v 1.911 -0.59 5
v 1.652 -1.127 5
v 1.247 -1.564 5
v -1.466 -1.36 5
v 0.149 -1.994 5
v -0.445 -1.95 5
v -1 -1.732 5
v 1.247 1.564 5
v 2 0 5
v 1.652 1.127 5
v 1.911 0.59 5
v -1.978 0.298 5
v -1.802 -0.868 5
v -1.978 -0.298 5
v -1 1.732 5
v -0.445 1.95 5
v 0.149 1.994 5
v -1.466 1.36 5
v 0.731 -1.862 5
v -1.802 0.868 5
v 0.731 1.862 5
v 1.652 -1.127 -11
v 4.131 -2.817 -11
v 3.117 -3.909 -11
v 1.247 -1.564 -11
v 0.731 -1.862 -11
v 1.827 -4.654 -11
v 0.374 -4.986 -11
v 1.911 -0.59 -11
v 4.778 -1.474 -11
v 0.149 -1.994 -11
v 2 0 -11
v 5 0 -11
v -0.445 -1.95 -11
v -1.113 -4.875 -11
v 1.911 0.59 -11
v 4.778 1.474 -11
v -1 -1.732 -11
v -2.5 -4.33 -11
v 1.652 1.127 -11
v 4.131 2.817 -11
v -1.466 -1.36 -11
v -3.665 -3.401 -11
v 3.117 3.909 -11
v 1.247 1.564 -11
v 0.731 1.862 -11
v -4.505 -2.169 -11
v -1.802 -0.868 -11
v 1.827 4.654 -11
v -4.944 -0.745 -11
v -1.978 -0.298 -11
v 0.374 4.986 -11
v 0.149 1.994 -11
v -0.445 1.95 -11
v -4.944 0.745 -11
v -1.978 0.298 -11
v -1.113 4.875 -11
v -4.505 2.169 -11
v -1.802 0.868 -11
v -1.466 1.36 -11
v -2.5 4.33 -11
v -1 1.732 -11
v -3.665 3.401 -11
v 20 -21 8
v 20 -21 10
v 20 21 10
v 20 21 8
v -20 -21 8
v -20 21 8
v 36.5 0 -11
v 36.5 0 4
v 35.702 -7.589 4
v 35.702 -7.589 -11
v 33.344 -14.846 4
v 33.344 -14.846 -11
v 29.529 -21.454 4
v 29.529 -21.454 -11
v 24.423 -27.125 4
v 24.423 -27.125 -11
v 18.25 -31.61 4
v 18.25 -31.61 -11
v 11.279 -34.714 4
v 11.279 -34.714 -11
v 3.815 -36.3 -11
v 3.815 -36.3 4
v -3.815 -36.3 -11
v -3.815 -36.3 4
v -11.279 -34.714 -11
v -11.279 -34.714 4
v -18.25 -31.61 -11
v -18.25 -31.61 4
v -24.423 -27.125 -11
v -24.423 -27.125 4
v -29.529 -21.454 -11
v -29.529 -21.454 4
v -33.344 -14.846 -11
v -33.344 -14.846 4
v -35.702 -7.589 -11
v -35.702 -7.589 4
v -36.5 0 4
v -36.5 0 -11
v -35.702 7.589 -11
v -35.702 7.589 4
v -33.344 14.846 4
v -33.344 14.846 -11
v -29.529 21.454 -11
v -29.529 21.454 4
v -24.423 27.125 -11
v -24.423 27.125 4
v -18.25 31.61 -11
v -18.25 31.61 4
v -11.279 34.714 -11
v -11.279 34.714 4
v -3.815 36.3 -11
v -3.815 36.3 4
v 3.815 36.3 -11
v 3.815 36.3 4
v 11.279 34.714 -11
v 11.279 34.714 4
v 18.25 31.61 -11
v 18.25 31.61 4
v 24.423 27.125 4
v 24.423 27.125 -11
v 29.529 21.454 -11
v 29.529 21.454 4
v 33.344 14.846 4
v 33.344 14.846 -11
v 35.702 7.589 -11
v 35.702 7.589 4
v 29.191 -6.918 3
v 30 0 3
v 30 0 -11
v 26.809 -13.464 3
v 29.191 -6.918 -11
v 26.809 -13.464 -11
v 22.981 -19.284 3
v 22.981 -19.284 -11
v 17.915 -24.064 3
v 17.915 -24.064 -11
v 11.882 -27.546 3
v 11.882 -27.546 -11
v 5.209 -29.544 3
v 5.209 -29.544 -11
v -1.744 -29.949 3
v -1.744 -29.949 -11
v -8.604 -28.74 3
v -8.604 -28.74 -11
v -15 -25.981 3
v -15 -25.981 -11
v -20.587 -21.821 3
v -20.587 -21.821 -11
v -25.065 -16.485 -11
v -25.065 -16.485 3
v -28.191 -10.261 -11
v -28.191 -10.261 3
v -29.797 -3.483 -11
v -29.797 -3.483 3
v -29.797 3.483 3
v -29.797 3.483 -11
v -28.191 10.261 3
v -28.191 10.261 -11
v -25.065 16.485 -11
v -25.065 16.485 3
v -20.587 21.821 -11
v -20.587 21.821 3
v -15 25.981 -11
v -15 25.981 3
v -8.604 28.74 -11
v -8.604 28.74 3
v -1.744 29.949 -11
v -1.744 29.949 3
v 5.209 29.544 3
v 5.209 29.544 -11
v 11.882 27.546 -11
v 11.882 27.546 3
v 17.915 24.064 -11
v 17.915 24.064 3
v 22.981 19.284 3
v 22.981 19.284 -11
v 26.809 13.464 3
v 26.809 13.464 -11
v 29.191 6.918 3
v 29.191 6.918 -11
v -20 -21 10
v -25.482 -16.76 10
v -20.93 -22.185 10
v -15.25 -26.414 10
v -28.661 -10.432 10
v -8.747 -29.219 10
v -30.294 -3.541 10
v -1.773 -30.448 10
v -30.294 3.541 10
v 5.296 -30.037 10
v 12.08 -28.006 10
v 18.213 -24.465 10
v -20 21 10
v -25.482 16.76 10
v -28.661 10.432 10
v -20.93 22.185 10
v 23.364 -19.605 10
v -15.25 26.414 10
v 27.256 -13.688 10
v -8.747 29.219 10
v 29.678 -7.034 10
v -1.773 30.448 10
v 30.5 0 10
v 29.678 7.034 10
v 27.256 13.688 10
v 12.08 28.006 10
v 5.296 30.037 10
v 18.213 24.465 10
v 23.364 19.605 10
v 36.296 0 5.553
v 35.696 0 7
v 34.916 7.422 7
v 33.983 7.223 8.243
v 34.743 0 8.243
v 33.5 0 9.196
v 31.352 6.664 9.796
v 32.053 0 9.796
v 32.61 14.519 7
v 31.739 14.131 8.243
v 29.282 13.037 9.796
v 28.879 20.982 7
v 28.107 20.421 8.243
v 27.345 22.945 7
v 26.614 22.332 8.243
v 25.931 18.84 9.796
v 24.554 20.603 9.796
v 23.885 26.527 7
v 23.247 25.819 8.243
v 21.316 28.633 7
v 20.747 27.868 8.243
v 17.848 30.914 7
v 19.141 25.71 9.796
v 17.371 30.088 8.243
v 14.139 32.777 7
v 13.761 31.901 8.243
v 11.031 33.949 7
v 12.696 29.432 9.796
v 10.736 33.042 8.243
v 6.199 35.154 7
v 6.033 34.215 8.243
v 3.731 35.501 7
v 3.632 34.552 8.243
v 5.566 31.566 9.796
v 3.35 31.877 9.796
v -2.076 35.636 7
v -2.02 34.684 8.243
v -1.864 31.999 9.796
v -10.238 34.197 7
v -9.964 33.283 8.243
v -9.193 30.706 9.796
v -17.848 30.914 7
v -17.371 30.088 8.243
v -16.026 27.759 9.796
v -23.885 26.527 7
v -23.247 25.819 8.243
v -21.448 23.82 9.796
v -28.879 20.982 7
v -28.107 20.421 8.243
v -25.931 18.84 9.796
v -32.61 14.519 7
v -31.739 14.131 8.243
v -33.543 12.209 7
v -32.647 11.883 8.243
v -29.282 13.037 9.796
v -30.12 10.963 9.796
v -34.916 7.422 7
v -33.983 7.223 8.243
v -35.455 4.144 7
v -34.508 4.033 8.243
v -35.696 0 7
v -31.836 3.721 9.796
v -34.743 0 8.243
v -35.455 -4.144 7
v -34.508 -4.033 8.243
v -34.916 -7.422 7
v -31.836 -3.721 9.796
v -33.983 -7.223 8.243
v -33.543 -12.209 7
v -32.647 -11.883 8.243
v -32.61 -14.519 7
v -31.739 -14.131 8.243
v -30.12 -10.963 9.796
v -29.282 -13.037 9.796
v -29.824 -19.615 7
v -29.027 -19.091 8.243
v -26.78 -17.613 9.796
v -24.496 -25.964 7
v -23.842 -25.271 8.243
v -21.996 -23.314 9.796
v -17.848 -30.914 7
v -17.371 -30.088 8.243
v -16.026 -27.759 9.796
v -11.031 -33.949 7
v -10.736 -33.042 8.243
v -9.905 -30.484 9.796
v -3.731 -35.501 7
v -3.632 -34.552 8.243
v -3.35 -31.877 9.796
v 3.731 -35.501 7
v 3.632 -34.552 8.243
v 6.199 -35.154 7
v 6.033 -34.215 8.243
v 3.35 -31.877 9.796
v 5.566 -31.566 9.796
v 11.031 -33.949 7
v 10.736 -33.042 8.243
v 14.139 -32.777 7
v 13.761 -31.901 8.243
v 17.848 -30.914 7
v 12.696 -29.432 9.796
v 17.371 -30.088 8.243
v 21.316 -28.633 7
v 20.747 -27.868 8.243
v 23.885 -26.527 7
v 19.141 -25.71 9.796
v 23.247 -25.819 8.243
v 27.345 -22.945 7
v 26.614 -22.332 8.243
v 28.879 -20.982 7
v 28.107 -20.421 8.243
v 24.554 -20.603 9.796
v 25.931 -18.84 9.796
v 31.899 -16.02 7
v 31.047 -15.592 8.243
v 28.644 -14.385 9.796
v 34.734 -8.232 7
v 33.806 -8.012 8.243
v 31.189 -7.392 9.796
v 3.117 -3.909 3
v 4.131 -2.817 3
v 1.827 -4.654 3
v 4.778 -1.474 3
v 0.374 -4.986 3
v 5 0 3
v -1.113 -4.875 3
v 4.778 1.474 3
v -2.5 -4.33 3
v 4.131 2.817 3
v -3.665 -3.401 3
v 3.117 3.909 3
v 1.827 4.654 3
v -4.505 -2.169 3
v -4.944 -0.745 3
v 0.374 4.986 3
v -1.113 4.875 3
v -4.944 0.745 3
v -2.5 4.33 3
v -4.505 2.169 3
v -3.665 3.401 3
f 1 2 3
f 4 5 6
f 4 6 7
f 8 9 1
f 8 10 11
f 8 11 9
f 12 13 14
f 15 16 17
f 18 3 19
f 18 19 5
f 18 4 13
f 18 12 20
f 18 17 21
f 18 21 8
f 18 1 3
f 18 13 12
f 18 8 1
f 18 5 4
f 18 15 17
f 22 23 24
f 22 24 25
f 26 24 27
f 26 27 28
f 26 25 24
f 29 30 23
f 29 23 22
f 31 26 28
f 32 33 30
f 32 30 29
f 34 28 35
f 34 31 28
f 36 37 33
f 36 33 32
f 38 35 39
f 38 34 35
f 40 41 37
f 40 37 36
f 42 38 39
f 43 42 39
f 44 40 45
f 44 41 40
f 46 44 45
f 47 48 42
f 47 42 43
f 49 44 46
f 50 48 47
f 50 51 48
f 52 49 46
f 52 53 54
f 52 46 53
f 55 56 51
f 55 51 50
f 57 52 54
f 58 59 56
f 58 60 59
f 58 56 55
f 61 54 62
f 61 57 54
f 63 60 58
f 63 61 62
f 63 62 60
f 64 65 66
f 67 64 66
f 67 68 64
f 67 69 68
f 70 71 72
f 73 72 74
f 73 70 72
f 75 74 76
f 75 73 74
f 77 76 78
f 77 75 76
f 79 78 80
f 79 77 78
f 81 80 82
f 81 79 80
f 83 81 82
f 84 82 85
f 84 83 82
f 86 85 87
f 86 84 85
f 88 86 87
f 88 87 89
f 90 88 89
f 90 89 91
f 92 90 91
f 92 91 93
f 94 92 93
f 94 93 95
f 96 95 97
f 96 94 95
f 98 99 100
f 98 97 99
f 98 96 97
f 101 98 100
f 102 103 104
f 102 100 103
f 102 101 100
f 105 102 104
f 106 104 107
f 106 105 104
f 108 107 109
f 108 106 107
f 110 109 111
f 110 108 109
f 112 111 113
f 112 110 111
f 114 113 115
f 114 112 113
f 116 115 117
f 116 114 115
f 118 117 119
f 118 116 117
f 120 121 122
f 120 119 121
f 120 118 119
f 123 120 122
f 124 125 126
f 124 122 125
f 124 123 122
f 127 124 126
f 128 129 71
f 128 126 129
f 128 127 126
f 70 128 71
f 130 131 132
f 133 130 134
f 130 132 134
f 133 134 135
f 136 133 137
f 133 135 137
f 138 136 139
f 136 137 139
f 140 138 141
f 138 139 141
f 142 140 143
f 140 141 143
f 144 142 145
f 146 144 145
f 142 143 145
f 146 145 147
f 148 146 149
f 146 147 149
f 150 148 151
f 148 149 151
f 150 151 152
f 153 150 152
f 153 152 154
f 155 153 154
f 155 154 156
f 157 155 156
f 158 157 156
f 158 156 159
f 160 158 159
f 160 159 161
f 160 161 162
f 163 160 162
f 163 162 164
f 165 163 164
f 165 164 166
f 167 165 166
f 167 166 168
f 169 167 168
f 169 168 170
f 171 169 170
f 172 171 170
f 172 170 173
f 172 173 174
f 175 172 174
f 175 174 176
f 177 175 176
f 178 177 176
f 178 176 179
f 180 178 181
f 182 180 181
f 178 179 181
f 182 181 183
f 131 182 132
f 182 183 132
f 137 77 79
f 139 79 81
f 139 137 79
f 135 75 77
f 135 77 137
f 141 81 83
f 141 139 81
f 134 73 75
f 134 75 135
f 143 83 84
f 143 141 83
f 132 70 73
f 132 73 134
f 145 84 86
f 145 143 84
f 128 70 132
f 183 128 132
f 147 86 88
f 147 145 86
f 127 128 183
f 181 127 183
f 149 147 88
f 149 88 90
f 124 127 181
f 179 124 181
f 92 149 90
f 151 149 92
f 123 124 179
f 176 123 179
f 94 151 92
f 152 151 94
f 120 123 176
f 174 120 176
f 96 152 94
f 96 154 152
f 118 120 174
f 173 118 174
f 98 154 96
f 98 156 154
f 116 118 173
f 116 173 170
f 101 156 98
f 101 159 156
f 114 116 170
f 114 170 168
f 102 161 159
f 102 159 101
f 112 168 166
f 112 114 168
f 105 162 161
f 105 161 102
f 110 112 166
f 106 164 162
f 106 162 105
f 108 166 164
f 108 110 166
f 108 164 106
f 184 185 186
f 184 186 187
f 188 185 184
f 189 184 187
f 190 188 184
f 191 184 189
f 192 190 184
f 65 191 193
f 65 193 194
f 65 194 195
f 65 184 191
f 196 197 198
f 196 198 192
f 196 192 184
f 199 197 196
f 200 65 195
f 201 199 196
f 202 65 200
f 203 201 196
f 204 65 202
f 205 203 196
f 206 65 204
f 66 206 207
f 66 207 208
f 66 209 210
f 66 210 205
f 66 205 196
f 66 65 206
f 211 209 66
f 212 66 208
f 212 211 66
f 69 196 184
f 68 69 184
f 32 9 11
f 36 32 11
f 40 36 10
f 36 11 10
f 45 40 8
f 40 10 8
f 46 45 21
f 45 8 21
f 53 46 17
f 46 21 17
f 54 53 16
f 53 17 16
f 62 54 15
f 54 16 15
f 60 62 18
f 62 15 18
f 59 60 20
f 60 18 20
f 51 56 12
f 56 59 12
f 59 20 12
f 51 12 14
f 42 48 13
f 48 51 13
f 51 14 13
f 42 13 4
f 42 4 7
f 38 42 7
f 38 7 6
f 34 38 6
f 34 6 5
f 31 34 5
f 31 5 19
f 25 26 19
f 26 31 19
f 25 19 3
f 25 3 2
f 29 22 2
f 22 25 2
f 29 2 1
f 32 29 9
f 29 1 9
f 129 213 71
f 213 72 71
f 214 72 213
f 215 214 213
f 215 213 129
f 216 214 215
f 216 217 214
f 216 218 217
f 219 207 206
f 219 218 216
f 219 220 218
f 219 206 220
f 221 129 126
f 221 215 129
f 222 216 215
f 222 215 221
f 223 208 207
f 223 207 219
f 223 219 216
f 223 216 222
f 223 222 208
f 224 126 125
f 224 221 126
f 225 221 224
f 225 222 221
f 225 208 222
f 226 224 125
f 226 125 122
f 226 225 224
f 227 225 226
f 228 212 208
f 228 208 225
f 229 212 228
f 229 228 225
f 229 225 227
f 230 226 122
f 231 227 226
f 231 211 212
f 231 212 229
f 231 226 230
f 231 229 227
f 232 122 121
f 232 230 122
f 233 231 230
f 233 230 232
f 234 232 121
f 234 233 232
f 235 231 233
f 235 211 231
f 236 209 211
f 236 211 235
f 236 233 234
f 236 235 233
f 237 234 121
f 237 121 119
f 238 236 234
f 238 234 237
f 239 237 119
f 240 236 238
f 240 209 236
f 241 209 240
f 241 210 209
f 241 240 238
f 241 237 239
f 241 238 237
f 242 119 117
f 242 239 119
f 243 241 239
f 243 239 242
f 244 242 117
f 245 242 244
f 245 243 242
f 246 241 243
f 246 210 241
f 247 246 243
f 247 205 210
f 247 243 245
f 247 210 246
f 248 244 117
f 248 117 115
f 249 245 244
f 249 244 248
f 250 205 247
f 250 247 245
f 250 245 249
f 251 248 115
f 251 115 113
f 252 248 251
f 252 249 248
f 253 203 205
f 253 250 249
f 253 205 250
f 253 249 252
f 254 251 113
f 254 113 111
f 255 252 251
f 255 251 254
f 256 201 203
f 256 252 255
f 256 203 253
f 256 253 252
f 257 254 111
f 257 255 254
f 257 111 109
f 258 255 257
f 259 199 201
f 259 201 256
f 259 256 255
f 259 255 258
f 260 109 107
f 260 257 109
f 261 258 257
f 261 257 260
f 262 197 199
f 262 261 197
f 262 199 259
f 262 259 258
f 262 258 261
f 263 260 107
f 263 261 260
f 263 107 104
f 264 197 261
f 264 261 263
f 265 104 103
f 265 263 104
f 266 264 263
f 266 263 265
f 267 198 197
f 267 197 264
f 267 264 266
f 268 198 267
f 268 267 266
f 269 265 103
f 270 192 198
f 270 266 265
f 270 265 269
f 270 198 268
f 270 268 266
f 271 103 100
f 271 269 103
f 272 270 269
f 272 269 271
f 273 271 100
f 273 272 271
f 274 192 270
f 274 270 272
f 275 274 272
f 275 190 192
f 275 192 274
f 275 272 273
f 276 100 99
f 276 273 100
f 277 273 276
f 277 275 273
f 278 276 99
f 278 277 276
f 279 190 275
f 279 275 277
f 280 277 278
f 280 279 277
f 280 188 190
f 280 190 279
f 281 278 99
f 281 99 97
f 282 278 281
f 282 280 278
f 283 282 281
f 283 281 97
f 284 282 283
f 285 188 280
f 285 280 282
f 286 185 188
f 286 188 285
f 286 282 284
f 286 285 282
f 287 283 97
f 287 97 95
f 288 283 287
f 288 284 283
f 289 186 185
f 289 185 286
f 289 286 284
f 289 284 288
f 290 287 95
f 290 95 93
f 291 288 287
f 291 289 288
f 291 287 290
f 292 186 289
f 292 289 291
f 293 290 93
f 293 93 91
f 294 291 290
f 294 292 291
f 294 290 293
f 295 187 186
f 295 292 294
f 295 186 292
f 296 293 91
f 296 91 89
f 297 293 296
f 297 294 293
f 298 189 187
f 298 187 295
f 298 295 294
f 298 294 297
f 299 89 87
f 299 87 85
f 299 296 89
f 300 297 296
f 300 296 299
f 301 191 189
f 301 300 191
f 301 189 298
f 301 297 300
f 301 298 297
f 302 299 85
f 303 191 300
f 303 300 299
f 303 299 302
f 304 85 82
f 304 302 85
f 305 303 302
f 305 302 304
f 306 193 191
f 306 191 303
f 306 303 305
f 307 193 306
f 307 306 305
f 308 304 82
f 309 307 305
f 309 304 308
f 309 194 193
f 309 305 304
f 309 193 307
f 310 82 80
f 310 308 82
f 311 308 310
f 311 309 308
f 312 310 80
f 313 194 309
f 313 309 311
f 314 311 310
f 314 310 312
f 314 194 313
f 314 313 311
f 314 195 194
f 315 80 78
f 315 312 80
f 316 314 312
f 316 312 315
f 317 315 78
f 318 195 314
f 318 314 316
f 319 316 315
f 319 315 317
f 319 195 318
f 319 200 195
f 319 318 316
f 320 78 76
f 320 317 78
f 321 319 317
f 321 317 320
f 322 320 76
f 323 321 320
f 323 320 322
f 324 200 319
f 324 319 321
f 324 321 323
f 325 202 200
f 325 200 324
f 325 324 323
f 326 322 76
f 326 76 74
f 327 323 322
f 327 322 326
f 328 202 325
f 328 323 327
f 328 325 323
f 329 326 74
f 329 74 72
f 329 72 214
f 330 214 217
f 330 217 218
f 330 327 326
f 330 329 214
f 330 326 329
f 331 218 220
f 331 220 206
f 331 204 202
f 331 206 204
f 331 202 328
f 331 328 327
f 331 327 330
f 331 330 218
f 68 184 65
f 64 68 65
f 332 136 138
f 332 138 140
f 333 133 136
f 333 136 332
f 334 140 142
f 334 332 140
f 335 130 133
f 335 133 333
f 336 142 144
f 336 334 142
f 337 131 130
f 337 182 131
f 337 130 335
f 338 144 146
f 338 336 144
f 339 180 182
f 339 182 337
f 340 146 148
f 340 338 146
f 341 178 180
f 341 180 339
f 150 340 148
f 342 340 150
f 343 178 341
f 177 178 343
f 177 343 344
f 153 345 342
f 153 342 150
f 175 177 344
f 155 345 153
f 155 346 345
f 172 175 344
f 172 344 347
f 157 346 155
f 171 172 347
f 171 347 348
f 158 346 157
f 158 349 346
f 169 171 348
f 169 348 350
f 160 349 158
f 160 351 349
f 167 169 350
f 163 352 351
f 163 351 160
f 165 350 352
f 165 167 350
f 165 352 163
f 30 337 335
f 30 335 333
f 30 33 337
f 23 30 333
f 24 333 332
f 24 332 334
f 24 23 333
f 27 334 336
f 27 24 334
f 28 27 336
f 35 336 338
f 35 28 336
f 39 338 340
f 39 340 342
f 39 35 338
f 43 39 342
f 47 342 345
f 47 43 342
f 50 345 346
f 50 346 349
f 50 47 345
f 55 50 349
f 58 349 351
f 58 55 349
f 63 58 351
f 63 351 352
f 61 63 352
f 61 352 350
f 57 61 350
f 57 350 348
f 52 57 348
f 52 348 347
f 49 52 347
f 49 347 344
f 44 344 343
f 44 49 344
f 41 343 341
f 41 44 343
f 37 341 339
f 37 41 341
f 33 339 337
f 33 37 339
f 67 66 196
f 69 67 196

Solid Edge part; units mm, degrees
sketch "Sketch1" plane through (0, 0, 0) normal (0, 0, 1) x (1, 0, 0)
  circle A0 centre (0, 0) radius 36.5
extrude "Protrusion1" add sketch "Sketch1" along normal blind 10
sketch "Sketch2" plane through (0, 0, 0) normal (0, 0, -1) x (1, 0, 0)
  circle A0 centre (0, 0) radius 2
extrude "Extrusionsausschnitt_1" cut sketch "Sketch2" against normal blind 5
sketch "Sketch3" plane through (0, 0, 10) normal (0, 0, 1) x (0, 1, 0)
  line L0 (-21, -20) -> (21, -20)
  line L1 (21, -20) -> (21, 20)
  line L2 (21, 20) -> (-21, 20)
  line L3 (-21, 20) -> (-21, -20)
  dimension "D1" = 42
  dimension "D2" = 40
extrude "Extrusionsausschnitt_2" cut sketch "Sketch3" against normal blind 2
sketch "Sketch4" plane through (0, 0, 0) normal (0, 0, -1) x (1, 0, 0)
  circle A0 centre (0, 0) radius 2
  circle A1 centre (0, 0) radius 36.5
extrude "Extrusionsausprägung_2" add sketch "Sketch4" along normal blind 11
sketch "Sketch5" plane through (0, 0, -11) normal (0, 0, -1) x (1, 0, 0)
  circle A0 centre (0, 0) radius 30
  circle A1 centre (0, 0) radius 5
  dimension "D1" = 10
  dimension "D2" = 60
extrude "Extrusionsausschnitt_3" cut sketch "Sketch5" against normal blind 14
fillet "Verrundung_1" radius 6 1 edges at (-36.5, 0, 10)
properties material "Nylon, allgemein"
